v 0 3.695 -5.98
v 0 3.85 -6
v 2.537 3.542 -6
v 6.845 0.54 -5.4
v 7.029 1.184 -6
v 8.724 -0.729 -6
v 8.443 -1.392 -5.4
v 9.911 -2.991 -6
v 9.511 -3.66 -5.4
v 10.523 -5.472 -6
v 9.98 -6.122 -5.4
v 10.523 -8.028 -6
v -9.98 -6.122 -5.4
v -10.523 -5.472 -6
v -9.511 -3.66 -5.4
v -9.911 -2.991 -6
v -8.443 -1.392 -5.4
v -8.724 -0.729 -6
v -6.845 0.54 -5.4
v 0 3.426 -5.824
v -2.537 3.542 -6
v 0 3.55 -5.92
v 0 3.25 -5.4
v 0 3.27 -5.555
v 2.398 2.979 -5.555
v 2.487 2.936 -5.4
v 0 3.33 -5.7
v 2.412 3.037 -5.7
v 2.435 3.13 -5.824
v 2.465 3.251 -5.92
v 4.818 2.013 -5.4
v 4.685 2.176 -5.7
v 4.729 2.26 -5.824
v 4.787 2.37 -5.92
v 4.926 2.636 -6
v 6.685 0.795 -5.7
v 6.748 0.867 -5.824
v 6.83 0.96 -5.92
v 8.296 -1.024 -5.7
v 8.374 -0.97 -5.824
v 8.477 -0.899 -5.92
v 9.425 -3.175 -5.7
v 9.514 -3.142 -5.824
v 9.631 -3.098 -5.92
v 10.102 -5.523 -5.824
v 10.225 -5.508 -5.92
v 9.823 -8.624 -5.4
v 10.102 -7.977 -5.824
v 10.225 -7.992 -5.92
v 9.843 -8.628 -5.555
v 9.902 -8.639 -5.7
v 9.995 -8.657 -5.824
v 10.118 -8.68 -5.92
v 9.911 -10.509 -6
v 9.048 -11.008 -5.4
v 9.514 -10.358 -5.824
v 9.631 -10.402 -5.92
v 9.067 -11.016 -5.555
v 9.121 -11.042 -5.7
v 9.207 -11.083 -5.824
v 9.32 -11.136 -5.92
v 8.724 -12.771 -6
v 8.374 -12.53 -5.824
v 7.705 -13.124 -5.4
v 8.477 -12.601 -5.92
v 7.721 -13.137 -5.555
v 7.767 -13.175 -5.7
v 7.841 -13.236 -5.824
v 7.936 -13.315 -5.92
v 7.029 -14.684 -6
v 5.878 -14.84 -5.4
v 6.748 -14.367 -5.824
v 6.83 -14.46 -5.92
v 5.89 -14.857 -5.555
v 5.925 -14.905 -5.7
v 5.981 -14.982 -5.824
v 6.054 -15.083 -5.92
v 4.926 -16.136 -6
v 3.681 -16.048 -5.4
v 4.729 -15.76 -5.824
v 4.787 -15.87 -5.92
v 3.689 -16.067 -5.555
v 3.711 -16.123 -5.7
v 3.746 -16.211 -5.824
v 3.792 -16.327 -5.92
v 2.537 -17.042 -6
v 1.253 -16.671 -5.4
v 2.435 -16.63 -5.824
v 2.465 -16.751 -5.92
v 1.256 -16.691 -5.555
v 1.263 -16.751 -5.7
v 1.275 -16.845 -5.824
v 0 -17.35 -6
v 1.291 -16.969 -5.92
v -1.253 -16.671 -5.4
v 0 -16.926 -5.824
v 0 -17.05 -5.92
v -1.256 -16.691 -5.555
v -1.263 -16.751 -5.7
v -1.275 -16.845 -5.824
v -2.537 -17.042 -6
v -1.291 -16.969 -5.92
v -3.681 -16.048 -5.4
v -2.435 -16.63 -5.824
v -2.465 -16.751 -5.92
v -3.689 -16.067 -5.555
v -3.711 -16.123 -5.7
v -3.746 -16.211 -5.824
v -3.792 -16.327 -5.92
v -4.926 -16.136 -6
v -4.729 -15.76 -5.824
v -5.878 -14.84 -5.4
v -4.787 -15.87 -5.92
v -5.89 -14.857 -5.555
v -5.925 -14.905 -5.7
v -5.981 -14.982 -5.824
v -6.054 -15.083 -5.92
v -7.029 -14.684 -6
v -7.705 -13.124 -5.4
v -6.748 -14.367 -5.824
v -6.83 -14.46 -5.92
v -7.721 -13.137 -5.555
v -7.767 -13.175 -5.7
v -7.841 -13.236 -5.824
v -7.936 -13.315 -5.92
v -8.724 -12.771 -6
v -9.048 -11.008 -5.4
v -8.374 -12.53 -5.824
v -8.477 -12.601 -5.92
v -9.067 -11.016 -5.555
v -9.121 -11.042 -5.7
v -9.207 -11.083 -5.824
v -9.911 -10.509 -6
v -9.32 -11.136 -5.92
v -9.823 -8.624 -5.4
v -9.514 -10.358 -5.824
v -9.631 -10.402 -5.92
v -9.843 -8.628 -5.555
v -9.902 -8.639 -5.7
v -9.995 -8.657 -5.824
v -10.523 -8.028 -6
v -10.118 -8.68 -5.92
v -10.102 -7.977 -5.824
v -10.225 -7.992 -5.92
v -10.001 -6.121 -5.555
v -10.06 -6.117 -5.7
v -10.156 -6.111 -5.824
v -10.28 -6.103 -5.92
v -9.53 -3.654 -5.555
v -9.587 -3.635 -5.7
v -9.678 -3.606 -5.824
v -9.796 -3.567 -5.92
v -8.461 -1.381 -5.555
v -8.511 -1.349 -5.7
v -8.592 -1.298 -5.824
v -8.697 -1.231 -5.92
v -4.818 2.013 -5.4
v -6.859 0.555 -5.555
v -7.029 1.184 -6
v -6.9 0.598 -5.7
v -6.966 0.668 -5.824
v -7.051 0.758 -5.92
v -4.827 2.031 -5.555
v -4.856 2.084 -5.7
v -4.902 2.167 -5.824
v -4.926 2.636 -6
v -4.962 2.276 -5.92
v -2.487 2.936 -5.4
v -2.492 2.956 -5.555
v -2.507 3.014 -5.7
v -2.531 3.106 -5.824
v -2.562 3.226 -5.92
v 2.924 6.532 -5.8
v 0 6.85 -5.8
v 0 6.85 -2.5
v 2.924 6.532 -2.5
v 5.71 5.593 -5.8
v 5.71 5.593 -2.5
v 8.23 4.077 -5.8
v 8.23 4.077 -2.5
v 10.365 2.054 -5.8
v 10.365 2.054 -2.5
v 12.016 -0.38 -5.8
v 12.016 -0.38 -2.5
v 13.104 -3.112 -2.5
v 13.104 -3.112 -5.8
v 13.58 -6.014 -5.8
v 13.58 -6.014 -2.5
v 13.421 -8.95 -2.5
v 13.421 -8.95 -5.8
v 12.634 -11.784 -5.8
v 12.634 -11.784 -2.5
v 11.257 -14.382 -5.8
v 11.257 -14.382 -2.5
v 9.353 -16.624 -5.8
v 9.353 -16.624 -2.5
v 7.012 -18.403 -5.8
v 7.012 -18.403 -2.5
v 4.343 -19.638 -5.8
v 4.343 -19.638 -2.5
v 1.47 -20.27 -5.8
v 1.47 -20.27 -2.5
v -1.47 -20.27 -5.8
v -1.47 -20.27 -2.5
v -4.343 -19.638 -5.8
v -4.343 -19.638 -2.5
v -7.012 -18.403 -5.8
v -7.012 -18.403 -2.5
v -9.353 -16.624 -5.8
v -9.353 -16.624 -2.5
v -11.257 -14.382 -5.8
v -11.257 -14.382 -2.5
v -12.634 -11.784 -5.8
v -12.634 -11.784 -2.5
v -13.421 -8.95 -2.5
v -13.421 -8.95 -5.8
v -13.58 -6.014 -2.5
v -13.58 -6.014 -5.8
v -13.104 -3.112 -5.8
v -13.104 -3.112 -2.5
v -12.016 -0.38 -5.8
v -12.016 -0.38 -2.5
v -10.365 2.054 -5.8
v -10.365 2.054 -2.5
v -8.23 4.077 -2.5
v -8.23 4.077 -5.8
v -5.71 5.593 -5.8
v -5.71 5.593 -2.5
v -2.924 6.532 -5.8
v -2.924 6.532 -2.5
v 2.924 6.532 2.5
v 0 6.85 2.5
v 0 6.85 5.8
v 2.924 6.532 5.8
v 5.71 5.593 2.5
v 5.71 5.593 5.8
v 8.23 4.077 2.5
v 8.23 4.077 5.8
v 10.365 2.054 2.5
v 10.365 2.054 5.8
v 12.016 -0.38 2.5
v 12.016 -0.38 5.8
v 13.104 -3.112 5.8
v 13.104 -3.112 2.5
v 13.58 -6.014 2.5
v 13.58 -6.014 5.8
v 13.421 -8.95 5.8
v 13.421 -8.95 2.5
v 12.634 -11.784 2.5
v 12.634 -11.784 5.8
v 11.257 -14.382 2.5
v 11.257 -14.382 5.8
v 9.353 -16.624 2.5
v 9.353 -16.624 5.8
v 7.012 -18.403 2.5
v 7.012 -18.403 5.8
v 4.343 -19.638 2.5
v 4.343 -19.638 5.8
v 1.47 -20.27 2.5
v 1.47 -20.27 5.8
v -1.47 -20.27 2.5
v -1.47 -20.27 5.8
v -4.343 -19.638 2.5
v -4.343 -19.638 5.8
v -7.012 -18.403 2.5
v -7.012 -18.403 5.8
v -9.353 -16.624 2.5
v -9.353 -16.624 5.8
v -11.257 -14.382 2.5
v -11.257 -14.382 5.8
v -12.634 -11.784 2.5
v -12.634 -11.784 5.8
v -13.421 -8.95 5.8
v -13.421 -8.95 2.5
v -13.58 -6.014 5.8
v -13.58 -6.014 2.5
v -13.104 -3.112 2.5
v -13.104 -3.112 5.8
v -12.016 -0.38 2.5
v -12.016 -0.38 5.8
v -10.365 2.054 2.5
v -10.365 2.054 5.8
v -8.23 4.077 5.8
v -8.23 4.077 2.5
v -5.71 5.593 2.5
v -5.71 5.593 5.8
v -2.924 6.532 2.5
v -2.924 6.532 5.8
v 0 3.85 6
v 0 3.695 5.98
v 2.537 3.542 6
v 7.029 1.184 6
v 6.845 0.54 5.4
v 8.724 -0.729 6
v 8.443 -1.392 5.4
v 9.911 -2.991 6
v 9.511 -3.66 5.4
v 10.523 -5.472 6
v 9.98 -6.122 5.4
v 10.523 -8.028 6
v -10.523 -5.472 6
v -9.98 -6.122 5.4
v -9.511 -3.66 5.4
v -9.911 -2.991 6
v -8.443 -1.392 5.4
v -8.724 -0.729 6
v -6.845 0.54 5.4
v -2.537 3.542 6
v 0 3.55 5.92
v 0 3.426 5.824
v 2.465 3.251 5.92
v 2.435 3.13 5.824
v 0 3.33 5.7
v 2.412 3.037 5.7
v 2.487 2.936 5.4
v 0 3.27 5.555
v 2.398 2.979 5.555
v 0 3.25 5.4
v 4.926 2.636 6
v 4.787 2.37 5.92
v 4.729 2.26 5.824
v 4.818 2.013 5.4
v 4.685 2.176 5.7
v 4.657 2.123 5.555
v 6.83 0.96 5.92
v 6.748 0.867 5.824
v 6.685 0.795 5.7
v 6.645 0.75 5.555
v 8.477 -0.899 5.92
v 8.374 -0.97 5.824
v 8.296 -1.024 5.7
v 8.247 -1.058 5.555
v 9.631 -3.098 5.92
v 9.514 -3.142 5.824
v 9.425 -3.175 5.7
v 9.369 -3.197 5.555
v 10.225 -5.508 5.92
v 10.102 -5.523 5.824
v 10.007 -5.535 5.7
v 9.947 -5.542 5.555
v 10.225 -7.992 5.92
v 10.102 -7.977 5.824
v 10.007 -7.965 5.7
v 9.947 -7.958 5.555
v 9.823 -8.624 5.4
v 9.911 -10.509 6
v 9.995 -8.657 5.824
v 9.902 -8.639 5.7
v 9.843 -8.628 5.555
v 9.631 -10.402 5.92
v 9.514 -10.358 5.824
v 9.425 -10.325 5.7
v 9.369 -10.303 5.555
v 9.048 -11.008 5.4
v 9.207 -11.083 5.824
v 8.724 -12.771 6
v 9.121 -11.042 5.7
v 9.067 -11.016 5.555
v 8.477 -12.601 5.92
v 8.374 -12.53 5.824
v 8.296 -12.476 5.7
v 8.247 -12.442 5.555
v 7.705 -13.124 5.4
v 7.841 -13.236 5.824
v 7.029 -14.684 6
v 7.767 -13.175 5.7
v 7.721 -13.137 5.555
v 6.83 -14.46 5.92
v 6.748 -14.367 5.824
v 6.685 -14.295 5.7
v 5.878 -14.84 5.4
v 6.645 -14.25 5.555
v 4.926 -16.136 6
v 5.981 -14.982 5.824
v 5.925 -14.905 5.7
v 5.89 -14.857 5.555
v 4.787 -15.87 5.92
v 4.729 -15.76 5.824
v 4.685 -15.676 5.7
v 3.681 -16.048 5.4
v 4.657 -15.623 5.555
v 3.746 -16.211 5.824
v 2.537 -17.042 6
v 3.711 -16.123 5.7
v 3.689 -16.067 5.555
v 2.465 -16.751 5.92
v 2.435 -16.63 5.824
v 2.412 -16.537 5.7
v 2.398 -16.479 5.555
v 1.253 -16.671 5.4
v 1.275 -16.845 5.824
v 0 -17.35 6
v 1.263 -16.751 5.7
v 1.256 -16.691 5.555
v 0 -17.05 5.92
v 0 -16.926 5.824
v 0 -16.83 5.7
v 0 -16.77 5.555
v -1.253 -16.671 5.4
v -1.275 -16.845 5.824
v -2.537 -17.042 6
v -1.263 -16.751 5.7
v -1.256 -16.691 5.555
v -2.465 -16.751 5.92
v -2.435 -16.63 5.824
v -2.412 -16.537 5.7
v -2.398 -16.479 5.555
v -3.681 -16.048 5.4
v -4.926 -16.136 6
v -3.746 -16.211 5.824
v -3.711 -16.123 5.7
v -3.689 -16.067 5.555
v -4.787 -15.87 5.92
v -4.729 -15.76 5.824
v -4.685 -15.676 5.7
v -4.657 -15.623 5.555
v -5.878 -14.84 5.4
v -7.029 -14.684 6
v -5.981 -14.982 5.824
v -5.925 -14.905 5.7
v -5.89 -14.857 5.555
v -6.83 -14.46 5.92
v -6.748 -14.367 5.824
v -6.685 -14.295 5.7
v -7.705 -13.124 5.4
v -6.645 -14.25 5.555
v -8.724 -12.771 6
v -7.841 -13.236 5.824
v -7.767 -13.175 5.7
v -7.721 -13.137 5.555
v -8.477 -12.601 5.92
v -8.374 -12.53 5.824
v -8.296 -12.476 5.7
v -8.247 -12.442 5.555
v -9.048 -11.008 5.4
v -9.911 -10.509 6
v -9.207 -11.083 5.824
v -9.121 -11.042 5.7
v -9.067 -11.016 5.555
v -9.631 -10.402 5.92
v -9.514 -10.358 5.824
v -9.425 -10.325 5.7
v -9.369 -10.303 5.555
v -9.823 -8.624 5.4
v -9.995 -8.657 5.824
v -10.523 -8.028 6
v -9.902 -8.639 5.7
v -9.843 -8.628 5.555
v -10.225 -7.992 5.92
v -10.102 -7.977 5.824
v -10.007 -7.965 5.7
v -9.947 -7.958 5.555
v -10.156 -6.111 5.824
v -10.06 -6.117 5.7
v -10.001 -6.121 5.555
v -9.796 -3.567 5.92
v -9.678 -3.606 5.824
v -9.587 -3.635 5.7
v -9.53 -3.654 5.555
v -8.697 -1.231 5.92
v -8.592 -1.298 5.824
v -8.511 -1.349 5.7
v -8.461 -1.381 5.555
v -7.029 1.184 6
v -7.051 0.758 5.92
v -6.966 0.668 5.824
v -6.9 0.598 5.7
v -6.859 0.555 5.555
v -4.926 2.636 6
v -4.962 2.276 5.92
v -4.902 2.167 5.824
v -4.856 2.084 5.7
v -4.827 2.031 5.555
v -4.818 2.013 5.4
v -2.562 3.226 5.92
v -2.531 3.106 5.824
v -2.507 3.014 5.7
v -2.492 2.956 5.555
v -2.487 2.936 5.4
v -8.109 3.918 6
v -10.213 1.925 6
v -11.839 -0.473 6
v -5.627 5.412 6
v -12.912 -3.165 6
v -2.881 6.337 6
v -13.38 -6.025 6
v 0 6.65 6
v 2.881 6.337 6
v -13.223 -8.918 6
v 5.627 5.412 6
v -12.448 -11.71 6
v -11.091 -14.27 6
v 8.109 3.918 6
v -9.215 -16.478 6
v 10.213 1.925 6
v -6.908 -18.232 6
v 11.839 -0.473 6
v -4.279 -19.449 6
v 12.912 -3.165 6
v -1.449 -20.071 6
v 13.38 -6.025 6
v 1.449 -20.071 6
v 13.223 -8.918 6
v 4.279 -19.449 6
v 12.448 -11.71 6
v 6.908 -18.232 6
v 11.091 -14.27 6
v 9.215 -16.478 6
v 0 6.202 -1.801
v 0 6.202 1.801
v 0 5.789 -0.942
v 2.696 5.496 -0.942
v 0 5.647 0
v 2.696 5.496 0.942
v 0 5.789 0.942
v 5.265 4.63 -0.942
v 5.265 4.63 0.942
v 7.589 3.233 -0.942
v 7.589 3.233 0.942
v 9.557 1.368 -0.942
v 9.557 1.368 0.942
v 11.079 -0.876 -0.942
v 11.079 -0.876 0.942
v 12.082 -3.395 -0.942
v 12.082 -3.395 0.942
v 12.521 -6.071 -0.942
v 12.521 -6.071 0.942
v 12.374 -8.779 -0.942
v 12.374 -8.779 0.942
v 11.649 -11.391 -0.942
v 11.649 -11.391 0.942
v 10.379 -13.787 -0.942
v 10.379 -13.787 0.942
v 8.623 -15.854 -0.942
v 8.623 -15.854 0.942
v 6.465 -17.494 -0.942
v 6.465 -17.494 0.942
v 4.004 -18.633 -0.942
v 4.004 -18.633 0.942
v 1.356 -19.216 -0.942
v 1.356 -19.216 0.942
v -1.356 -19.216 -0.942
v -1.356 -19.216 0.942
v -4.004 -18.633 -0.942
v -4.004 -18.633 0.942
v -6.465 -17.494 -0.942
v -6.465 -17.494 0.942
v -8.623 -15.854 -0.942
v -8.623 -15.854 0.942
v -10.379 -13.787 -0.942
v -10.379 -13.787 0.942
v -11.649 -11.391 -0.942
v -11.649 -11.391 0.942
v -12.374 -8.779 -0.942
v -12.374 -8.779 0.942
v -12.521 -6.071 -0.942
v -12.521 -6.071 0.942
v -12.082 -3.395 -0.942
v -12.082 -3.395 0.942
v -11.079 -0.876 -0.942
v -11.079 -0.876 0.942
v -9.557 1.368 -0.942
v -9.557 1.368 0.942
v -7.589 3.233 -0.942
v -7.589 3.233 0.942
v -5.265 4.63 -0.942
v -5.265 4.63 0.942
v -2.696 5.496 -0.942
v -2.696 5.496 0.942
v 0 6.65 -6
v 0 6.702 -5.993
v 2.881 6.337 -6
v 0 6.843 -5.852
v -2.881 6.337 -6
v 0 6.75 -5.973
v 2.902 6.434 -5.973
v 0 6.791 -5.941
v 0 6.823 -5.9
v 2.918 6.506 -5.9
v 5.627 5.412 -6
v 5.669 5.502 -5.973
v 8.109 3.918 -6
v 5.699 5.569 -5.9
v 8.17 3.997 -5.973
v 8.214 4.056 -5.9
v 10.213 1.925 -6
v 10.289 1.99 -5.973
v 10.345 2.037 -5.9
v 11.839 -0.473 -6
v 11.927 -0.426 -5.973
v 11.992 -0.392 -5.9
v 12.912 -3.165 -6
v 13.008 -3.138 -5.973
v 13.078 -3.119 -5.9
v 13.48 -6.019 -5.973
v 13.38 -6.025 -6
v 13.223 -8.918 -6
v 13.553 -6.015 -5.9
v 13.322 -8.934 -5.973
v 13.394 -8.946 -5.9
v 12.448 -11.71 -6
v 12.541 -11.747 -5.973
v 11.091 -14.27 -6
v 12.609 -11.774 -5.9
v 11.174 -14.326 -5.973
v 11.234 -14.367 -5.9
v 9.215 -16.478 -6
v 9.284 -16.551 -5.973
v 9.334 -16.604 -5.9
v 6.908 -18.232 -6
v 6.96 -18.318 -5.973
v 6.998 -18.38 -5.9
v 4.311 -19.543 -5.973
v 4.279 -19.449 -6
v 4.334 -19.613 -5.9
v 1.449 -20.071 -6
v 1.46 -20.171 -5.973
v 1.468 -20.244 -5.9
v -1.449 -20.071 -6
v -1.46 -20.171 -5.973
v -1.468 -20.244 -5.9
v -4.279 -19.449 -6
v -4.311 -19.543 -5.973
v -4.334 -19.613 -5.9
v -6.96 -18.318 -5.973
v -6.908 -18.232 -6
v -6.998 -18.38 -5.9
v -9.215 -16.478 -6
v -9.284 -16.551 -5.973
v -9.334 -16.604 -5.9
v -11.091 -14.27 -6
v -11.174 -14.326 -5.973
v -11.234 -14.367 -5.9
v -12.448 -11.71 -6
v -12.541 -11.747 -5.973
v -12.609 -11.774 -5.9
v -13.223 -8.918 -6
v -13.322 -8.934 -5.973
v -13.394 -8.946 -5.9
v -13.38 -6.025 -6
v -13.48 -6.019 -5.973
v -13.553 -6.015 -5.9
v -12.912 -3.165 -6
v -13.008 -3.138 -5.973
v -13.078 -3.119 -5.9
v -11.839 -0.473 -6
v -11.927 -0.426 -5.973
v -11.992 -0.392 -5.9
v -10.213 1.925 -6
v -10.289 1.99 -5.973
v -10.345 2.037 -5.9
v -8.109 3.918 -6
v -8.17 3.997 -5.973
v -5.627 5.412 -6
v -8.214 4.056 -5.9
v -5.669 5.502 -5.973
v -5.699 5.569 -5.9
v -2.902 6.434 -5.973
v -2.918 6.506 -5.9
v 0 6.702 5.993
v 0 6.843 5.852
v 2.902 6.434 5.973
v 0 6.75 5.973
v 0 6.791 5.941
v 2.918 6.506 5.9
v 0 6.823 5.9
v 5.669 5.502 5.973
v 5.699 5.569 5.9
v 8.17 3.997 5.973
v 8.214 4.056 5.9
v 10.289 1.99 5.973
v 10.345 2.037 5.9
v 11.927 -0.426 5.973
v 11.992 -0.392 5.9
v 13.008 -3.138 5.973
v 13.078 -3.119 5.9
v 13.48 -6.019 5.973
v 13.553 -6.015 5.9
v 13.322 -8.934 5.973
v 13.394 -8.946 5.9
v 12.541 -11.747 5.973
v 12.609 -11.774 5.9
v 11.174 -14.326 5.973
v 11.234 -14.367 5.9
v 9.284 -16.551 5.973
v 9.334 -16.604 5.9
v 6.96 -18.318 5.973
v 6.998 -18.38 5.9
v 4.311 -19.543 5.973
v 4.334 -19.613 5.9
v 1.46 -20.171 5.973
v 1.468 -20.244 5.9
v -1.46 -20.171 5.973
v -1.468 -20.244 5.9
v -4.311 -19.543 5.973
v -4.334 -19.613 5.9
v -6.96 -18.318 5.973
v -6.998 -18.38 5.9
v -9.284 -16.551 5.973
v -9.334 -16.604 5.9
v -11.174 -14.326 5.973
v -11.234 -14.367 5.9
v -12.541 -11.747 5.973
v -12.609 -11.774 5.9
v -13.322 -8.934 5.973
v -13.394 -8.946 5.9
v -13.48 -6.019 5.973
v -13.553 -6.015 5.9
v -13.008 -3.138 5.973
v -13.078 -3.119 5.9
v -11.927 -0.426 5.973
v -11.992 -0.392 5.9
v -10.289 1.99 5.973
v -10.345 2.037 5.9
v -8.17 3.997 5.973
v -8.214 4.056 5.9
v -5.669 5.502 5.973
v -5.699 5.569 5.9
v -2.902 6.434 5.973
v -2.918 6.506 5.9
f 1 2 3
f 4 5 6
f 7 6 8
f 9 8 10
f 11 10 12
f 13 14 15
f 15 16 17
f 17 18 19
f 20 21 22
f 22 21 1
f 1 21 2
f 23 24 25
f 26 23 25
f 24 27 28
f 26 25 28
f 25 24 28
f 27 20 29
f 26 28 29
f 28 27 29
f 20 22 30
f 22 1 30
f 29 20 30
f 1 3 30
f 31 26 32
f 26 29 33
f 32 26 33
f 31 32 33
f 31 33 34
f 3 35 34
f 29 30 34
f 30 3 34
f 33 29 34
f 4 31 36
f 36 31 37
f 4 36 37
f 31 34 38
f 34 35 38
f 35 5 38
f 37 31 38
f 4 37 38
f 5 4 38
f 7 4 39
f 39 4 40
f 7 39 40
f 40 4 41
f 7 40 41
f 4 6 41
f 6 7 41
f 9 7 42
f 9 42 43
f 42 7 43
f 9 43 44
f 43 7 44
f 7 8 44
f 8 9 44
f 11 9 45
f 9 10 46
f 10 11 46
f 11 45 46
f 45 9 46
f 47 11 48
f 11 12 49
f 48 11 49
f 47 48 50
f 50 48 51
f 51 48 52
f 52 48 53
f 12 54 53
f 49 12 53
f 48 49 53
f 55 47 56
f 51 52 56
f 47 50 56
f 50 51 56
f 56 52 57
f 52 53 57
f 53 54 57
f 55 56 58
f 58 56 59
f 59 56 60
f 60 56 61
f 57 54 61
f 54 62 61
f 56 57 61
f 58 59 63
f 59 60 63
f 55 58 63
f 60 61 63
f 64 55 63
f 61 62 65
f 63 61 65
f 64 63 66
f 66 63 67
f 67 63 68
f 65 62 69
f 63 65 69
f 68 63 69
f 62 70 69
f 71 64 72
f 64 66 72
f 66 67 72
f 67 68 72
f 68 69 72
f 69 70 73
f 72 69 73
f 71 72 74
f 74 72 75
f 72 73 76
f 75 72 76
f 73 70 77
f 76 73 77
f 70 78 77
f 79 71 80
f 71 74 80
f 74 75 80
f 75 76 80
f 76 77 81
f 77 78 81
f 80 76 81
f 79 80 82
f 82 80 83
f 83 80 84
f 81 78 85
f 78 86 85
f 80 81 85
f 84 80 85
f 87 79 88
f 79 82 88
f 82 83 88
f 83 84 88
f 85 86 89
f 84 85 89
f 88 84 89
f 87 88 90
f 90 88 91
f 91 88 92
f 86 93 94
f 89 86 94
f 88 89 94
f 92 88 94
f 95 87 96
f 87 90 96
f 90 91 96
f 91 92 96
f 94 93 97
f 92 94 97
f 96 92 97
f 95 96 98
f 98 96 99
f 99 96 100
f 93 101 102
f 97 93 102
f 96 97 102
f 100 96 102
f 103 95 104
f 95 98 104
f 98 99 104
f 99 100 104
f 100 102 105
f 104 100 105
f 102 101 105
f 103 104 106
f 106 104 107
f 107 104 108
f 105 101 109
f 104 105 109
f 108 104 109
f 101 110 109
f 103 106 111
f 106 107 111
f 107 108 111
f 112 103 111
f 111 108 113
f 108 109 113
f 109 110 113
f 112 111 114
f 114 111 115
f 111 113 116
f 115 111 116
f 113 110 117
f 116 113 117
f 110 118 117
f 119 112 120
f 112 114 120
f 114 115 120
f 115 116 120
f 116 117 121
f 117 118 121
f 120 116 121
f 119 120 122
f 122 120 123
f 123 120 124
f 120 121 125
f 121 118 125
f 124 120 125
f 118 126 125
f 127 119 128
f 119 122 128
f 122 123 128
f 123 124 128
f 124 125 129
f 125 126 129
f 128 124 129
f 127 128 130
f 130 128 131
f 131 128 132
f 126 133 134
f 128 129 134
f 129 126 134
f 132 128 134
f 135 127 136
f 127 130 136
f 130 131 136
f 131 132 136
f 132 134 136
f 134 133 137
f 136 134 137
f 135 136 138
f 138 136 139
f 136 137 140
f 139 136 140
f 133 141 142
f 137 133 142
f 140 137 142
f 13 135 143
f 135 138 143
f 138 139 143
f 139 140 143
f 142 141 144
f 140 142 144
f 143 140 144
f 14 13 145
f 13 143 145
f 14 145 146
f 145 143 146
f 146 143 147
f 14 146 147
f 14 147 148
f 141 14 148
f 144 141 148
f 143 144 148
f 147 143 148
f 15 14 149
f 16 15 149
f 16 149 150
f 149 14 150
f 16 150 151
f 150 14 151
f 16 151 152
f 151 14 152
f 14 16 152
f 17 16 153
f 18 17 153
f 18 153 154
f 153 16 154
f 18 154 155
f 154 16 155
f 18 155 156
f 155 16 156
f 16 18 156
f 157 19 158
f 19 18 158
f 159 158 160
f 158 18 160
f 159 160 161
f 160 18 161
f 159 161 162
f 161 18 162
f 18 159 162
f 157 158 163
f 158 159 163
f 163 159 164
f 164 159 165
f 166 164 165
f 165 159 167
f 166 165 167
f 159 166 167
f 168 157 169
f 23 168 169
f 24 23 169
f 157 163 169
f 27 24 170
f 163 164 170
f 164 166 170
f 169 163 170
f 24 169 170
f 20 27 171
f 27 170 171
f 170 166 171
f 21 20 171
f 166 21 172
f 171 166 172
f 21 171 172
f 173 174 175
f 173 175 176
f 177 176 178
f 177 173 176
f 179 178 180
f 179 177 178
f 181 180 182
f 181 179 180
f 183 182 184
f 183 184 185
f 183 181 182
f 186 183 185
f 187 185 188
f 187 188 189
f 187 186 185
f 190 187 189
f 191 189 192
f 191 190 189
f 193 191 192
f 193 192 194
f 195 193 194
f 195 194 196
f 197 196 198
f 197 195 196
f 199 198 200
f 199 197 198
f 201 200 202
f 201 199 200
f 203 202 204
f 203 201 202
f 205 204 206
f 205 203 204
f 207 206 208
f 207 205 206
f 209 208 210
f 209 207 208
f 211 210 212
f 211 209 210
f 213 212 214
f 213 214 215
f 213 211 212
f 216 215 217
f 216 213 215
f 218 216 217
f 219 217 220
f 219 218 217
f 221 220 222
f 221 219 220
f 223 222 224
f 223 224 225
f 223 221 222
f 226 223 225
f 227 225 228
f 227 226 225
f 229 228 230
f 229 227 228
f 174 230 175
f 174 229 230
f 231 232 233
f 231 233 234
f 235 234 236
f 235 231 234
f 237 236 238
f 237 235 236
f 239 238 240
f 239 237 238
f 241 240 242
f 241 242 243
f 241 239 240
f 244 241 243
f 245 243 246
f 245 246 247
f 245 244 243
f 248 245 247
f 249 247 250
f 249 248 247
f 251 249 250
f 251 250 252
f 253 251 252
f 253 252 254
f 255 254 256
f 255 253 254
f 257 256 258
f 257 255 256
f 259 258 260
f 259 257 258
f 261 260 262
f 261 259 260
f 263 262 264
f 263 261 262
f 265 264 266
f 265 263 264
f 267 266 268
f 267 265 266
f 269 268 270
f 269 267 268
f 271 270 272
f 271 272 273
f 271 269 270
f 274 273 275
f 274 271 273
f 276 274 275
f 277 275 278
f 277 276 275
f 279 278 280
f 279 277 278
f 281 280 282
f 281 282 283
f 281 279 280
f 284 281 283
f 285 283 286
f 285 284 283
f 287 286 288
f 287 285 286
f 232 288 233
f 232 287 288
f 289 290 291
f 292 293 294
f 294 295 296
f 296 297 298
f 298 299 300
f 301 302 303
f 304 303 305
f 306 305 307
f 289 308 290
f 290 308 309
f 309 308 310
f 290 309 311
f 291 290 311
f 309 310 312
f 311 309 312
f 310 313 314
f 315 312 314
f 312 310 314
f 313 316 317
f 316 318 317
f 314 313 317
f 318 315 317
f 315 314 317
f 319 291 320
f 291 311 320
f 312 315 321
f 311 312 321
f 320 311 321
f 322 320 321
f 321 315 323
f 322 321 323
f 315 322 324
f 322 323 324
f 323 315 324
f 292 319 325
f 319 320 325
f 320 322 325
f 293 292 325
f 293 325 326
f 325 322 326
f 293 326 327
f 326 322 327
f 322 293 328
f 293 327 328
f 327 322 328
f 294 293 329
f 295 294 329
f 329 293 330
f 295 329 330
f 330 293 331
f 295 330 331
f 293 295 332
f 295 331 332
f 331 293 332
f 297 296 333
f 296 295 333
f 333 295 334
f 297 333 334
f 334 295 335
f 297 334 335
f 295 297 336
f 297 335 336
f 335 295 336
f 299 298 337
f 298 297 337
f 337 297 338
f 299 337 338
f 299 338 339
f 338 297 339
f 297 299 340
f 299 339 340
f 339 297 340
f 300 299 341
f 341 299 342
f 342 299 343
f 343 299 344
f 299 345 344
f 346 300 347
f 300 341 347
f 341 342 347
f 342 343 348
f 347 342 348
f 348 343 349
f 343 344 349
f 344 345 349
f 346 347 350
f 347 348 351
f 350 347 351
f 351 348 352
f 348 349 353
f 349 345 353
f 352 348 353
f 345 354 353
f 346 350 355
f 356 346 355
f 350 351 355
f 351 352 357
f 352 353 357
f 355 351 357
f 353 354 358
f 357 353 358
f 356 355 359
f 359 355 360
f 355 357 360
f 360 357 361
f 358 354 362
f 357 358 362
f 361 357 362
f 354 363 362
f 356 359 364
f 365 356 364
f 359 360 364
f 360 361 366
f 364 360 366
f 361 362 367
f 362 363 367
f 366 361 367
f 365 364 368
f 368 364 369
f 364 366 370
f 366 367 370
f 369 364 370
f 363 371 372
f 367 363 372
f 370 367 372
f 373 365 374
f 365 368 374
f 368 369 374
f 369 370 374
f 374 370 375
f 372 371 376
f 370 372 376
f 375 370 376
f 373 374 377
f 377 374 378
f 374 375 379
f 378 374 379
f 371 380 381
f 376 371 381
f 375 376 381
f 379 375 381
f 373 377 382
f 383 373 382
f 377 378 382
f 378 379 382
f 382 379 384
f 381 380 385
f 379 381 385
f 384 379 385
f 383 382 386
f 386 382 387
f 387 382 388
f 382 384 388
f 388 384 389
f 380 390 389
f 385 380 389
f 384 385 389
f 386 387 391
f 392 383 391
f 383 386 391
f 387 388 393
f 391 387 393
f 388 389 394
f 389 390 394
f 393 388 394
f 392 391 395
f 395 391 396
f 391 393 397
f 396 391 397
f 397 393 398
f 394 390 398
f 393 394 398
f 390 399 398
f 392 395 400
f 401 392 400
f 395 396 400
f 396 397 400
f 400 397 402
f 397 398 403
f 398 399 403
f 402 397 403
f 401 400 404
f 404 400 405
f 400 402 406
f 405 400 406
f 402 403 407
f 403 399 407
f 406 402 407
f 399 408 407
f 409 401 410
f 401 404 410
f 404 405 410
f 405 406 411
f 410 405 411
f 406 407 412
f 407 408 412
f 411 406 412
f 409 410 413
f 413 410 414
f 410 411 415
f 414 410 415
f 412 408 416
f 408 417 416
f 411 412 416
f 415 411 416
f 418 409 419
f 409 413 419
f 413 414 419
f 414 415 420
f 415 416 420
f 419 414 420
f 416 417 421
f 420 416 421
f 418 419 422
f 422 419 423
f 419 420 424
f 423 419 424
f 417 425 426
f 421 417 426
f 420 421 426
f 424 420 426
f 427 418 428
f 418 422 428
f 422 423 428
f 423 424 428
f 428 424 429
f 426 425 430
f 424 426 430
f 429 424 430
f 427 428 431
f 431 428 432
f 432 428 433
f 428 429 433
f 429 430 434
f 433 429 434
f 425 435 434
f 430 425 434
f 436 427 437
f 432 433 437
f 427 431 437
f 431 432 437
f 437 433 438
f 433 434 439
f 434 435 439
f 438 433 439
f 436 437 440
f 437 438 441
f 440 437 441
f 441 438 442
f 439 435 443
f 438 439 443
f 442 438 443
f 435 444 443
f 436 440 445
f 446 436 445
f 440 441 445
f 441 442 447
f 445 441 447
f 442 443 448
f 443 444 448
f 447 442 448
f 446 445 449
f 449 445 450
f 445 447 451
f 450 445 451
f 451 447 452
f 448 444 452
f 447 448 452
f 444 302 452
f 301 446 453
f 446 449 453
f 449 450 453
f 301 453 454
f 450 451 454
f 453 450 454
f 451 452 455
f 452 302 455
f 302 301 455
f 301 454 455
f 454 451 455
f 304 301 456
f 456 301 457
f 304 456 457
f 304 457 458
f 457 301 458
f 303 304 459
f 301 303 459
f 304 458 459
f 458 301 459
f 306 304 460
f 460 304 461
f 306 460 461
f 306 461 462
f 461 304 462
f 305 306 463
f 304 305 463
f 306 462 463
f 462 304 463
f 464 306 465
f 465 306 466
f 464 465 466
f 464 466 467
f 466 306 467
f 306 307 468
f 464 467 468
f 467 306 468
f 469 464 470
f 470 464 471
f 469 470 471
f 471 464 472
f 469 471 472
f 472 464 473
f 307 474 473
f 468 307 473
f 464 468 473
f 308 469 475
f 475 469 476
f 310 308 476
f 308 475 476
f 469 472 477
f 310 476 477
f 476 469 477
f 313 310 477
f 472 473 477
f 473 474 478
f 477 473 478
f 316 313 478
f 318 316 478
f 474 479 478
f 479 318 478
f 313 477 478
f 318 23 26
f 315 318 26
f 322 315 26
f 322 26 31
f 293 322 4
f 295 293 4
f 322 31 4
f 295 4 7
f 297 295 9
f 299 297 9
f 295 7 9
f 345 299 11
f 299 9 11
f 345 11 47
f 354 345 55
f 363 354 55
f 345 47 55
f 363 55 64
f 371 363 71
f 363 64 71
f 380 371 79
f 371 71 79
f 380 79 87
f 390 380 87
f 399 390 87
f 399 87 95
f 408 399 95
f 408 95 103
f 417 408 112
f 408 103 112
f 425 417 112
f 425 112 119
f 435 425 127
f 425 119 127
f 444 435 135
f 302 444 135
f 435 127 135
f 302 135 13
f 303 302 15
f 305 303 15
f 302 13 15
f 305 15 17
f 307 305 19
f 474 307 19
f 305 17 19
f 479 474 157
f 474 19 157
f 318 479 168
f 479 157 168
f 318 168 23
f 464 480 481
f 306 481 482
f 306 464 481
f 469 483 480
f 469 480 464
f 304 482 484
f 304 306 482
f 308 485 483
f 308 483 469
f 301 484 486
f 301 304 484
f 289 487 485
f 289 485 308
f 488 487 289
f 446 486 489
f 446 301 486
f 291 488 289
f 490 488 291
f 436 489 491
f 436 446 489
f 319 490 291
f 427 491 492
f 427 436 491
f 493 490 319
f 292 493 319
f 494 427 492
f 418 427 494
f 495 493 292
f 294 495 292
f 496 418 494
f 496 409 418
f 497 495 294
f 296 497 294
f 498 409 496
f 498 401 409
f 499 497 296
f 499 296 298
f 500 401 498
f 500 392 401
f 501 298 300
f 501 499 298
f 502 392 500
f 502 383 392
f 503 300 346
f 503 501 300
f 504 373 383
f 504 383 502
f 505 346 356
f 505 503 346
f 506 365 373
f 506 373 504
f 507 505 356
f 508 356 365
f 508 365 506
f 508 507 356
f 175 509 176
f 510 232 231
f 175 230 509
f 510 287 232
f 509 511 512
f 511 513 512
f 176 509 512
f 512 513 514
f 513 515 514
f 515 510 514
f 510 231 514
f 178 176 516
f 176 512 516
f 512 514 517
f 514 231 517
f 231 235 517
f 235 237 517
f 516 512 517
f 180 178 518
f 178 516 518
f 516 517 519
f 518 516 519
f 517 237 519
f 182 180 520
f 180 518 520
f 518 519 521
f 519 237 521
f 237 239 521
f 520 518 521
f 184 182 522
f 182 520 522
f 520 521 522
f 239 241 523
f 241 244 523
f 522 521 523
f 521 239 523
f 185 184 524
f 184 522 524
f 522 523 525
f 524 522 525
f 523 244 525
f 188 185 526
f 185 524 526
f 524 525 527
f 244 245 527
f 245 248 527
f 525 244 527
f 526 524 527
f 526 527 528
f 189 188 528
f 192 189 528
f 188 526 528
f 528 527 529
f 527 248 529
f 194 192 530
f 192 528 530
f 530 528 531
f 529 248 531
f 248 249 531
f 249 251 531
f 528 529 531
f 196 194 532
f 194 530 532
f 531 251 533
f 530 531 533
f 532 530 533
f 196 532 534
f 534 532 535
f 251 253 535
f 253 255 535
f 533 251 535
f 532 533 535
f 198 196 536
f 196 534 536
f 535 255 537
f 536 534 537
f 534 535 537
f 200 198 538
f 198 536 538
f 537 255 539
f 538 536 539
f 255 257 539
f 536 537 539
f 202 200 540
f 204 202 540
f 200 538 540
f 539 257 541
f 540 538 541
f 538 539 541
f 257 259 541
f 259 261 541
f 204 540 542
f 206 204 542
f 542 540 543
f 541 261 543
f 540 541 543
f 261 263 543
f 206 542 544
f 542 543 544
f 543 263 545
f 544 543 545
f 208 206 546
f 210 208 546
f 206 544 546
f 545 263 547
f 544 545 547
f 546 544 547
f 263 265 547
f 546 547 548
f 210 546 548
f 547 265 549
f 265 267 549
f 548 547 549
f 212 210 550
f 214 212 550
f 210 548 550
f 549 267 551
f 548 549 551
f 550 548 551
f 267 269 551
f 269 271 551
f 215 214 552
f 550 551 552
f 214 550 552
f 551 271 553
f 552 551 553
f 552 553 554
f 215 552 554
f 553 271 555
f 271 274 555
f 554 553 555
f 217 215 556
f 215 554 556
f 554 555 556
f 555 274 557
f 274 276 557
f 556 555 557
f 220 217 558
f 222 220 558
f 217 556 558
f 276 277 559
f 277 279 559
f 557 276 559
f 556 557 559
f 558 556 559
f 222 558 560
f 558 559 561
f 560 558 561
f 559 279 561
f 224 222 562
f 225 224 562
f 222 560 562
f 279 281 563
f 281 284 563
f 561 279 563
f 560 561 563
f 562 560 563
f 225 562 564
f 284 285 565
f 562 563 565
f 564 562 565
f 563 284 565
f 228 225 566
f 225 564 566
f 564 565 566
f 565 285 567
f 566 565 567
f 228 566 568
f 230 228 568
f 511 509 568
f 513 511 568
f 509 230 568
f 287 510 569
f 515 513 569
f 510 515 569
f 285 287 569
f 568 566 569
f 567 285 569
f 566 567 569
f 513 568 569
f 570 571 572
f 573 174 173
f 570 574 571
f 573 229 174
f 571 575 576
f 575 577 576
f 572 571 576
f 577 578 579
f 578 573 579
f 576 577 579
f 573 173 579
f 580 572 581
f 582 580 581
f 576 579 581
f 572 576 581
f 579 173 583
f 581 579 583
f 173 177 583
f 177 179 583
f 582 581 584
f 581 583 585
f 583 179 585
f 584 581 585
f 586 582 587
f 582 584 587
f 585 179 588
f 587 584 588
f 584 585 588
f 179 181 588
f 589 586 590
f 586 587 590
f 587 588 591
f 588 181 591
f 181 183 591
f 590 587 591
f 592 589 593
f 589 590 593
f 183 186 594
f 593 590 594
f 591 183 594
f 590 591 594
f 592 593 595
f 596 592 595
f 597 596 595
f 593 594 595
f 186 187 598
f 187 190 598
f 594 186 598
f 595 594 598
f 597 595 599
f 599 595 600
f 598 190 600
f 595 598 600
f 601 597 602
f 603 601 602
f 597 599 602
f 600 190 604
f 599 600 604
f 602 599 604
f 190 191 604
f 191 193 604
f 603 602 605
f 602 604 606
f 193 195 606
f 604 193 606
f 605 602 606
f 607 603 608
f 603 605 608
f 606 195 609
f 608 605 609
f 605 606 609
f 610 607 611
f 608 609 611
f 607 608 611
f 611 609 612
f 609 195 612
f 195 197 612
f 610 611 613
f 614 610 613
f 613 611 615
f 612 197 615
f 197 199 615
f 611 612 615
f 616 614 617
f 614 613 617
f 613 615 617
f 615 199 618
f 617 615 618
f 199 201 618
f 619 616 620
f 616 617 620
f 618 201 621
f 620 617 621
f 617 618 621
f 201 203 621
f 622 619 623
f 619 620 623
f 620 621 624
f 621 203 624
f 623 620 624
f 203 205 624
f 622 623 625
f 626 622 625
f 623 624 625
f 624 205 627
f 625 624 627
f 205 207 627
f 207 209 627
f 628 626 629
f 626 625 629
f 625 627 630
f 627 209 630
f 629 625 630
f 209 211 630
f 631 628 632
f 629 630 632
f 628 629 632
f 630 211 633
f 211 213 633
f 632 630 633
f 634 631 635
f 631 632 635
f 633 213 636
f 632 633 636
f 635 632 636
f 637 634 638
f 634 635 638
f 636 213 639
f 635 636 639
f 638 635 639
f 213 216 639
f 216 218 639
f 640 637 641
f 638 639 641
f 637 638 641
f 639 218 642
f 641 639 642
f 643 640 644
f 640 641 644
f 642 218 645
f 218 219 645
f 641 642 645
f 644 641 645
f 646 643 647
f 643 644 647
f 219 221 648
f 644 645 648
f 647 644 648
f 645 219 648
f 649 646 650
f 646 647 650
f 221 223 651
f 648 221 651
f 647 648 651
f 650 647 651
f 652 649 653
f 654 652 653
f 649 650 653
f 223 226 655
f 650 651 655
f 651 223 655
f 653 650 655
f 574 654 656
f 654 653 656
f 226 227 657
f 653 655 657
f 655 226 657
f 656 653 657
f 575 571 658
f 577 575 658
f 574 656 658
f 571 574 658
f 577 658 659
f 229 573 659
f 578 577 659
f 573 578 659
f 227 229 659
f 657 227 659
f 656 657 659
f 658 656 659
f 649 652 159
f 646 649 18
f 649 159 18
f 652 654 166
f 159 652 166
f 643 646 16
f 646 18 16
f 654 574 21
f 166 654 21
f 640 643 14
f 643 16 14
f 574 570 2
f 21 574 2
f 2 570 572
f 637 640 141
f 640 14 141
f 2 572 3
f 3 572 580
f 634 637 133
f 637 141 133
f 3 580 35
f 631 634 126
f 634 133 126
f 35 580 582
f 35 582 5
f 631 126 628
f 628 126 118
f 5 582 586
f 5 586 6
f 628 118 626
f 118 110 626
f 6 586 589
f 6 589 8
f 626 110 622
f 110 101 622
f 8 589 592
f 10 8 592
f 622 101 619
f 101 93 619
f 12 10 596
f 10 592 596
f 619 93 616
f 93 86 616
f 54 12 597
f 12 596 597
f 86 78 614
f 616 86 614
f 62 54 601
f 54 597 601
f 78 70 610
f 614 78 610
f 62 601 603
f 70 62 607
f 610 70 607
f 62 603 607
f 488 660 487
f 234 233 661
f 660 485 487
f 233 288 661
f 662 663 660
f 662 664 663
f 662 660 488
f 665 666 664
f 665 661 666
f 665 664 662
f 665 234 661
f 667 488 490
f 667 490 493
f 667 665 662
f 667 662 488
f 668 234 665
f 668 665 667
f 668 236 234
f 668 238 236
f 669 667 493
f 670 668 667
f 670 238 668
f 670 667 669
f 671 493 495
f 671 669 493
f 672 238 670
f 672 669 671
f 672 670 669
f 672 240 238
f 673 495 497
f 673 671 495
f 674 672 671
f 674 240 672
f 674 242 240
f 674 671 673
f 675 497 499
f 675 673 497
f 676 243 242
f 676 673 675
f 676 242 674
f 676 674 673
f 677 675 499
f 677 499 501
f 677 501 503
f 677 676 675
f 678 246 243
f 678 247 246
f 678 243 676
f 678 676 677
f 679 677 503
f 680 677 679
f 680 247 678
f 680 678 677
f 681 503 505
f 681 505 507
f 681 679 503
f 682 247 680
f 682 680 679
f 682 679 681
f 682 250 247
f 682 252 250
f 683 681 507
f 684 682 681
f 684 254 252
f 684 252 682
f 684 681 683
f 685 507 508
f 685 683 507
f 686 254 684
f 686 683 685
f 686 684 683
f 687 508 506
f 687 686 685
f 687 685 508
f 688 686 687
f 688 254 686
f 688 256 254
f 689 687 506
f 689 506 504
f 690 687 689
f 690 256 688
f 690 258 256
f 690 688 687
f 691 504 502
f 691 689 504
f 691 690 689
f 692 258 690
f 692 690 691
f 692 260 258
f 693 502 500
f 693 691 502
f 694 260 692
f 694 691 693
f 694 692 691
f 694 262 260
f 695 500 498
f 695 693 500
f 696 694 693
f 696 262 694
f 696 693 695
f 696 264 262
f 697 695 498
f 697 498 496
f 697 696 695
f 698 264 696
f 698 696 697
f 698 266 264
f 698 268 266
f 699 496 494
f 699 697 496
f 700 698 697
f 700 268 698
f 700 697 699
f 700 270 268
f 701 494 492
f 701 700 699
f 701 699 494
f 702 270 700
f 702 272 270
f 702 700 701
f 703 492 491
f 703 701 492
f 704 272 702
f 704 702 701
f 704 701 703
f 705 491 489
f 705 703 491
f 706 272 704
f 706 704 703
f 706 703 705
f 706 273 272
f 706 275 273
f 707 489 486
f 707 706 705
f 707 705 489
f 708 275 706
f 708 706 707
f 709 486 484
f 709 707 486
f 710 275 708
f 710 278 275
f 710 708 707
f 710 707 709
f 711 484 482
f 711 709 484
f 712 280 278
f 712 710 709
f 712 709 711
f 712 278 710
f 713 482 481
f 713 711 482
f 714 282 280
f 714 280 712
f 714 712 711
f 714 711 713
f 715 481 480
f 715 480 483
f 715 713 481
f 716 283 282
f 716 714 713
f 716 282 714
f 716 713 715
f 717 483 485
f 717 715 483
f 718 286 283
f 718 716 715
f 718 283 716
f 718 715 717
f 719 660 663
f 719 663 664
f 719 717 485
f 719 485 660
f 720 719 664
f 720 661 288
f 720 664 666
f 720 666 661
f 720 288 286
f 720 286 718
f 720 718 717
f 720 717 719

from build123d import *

# Parameters (mm, degrees)
SKETCH2_W = 3.5
SKETCH2_H = 3.6
FILLET1_R = 0.2
FILLET2_R = 0.6


with BuildPart() as part:
    # Sketch2 → Revolve1 (revolve)
    with BuildSketch(Plane(origin=(0, 0, 0), x_dir=(0, 0, -1), z_dir=(1, 0, 0))):
        with Locations((-4.25, 5.05)):
            Rectangle(SKETCH2_W, SKETCH2_H)
        with BuildLine():
            ThreePointArc((2.5, 6.85), (0, 5.647498436), (-2.5, 6.85))
            Line((-2.5, 6.85), (-2.5, 3.25))
            Line((-2.5, 3.25), (2.5, 3.25))
            Line((2.5, 3.25), (2.5, 6.85))
        make_face()
        with Locations((4.25, 5.05)):
            Rectangle(SKETCH2_W, SKETCH2_H)
    revolve(axis=Axis((0, -6.75, 6), (0, 0, -1)))

    # Fillet1
    fillet1_edges = [part.edges().sort_by_distance(p)[0] for p in [
        (0, -20.35, 6),
        (0, -20.35, -6),
    ]]
    fillet(fillet1_edges, radius=FILLET1_R)

    # Fillet2
    fillet2_edges = [part.edges().sort_by_distance(p)[0] for p in [
        (0, -16.75, -6),
        (0, -16.75, 6),
    ]]
    fillet(fillet2_edges, radius=FILLET2_R)


solid = part.part
